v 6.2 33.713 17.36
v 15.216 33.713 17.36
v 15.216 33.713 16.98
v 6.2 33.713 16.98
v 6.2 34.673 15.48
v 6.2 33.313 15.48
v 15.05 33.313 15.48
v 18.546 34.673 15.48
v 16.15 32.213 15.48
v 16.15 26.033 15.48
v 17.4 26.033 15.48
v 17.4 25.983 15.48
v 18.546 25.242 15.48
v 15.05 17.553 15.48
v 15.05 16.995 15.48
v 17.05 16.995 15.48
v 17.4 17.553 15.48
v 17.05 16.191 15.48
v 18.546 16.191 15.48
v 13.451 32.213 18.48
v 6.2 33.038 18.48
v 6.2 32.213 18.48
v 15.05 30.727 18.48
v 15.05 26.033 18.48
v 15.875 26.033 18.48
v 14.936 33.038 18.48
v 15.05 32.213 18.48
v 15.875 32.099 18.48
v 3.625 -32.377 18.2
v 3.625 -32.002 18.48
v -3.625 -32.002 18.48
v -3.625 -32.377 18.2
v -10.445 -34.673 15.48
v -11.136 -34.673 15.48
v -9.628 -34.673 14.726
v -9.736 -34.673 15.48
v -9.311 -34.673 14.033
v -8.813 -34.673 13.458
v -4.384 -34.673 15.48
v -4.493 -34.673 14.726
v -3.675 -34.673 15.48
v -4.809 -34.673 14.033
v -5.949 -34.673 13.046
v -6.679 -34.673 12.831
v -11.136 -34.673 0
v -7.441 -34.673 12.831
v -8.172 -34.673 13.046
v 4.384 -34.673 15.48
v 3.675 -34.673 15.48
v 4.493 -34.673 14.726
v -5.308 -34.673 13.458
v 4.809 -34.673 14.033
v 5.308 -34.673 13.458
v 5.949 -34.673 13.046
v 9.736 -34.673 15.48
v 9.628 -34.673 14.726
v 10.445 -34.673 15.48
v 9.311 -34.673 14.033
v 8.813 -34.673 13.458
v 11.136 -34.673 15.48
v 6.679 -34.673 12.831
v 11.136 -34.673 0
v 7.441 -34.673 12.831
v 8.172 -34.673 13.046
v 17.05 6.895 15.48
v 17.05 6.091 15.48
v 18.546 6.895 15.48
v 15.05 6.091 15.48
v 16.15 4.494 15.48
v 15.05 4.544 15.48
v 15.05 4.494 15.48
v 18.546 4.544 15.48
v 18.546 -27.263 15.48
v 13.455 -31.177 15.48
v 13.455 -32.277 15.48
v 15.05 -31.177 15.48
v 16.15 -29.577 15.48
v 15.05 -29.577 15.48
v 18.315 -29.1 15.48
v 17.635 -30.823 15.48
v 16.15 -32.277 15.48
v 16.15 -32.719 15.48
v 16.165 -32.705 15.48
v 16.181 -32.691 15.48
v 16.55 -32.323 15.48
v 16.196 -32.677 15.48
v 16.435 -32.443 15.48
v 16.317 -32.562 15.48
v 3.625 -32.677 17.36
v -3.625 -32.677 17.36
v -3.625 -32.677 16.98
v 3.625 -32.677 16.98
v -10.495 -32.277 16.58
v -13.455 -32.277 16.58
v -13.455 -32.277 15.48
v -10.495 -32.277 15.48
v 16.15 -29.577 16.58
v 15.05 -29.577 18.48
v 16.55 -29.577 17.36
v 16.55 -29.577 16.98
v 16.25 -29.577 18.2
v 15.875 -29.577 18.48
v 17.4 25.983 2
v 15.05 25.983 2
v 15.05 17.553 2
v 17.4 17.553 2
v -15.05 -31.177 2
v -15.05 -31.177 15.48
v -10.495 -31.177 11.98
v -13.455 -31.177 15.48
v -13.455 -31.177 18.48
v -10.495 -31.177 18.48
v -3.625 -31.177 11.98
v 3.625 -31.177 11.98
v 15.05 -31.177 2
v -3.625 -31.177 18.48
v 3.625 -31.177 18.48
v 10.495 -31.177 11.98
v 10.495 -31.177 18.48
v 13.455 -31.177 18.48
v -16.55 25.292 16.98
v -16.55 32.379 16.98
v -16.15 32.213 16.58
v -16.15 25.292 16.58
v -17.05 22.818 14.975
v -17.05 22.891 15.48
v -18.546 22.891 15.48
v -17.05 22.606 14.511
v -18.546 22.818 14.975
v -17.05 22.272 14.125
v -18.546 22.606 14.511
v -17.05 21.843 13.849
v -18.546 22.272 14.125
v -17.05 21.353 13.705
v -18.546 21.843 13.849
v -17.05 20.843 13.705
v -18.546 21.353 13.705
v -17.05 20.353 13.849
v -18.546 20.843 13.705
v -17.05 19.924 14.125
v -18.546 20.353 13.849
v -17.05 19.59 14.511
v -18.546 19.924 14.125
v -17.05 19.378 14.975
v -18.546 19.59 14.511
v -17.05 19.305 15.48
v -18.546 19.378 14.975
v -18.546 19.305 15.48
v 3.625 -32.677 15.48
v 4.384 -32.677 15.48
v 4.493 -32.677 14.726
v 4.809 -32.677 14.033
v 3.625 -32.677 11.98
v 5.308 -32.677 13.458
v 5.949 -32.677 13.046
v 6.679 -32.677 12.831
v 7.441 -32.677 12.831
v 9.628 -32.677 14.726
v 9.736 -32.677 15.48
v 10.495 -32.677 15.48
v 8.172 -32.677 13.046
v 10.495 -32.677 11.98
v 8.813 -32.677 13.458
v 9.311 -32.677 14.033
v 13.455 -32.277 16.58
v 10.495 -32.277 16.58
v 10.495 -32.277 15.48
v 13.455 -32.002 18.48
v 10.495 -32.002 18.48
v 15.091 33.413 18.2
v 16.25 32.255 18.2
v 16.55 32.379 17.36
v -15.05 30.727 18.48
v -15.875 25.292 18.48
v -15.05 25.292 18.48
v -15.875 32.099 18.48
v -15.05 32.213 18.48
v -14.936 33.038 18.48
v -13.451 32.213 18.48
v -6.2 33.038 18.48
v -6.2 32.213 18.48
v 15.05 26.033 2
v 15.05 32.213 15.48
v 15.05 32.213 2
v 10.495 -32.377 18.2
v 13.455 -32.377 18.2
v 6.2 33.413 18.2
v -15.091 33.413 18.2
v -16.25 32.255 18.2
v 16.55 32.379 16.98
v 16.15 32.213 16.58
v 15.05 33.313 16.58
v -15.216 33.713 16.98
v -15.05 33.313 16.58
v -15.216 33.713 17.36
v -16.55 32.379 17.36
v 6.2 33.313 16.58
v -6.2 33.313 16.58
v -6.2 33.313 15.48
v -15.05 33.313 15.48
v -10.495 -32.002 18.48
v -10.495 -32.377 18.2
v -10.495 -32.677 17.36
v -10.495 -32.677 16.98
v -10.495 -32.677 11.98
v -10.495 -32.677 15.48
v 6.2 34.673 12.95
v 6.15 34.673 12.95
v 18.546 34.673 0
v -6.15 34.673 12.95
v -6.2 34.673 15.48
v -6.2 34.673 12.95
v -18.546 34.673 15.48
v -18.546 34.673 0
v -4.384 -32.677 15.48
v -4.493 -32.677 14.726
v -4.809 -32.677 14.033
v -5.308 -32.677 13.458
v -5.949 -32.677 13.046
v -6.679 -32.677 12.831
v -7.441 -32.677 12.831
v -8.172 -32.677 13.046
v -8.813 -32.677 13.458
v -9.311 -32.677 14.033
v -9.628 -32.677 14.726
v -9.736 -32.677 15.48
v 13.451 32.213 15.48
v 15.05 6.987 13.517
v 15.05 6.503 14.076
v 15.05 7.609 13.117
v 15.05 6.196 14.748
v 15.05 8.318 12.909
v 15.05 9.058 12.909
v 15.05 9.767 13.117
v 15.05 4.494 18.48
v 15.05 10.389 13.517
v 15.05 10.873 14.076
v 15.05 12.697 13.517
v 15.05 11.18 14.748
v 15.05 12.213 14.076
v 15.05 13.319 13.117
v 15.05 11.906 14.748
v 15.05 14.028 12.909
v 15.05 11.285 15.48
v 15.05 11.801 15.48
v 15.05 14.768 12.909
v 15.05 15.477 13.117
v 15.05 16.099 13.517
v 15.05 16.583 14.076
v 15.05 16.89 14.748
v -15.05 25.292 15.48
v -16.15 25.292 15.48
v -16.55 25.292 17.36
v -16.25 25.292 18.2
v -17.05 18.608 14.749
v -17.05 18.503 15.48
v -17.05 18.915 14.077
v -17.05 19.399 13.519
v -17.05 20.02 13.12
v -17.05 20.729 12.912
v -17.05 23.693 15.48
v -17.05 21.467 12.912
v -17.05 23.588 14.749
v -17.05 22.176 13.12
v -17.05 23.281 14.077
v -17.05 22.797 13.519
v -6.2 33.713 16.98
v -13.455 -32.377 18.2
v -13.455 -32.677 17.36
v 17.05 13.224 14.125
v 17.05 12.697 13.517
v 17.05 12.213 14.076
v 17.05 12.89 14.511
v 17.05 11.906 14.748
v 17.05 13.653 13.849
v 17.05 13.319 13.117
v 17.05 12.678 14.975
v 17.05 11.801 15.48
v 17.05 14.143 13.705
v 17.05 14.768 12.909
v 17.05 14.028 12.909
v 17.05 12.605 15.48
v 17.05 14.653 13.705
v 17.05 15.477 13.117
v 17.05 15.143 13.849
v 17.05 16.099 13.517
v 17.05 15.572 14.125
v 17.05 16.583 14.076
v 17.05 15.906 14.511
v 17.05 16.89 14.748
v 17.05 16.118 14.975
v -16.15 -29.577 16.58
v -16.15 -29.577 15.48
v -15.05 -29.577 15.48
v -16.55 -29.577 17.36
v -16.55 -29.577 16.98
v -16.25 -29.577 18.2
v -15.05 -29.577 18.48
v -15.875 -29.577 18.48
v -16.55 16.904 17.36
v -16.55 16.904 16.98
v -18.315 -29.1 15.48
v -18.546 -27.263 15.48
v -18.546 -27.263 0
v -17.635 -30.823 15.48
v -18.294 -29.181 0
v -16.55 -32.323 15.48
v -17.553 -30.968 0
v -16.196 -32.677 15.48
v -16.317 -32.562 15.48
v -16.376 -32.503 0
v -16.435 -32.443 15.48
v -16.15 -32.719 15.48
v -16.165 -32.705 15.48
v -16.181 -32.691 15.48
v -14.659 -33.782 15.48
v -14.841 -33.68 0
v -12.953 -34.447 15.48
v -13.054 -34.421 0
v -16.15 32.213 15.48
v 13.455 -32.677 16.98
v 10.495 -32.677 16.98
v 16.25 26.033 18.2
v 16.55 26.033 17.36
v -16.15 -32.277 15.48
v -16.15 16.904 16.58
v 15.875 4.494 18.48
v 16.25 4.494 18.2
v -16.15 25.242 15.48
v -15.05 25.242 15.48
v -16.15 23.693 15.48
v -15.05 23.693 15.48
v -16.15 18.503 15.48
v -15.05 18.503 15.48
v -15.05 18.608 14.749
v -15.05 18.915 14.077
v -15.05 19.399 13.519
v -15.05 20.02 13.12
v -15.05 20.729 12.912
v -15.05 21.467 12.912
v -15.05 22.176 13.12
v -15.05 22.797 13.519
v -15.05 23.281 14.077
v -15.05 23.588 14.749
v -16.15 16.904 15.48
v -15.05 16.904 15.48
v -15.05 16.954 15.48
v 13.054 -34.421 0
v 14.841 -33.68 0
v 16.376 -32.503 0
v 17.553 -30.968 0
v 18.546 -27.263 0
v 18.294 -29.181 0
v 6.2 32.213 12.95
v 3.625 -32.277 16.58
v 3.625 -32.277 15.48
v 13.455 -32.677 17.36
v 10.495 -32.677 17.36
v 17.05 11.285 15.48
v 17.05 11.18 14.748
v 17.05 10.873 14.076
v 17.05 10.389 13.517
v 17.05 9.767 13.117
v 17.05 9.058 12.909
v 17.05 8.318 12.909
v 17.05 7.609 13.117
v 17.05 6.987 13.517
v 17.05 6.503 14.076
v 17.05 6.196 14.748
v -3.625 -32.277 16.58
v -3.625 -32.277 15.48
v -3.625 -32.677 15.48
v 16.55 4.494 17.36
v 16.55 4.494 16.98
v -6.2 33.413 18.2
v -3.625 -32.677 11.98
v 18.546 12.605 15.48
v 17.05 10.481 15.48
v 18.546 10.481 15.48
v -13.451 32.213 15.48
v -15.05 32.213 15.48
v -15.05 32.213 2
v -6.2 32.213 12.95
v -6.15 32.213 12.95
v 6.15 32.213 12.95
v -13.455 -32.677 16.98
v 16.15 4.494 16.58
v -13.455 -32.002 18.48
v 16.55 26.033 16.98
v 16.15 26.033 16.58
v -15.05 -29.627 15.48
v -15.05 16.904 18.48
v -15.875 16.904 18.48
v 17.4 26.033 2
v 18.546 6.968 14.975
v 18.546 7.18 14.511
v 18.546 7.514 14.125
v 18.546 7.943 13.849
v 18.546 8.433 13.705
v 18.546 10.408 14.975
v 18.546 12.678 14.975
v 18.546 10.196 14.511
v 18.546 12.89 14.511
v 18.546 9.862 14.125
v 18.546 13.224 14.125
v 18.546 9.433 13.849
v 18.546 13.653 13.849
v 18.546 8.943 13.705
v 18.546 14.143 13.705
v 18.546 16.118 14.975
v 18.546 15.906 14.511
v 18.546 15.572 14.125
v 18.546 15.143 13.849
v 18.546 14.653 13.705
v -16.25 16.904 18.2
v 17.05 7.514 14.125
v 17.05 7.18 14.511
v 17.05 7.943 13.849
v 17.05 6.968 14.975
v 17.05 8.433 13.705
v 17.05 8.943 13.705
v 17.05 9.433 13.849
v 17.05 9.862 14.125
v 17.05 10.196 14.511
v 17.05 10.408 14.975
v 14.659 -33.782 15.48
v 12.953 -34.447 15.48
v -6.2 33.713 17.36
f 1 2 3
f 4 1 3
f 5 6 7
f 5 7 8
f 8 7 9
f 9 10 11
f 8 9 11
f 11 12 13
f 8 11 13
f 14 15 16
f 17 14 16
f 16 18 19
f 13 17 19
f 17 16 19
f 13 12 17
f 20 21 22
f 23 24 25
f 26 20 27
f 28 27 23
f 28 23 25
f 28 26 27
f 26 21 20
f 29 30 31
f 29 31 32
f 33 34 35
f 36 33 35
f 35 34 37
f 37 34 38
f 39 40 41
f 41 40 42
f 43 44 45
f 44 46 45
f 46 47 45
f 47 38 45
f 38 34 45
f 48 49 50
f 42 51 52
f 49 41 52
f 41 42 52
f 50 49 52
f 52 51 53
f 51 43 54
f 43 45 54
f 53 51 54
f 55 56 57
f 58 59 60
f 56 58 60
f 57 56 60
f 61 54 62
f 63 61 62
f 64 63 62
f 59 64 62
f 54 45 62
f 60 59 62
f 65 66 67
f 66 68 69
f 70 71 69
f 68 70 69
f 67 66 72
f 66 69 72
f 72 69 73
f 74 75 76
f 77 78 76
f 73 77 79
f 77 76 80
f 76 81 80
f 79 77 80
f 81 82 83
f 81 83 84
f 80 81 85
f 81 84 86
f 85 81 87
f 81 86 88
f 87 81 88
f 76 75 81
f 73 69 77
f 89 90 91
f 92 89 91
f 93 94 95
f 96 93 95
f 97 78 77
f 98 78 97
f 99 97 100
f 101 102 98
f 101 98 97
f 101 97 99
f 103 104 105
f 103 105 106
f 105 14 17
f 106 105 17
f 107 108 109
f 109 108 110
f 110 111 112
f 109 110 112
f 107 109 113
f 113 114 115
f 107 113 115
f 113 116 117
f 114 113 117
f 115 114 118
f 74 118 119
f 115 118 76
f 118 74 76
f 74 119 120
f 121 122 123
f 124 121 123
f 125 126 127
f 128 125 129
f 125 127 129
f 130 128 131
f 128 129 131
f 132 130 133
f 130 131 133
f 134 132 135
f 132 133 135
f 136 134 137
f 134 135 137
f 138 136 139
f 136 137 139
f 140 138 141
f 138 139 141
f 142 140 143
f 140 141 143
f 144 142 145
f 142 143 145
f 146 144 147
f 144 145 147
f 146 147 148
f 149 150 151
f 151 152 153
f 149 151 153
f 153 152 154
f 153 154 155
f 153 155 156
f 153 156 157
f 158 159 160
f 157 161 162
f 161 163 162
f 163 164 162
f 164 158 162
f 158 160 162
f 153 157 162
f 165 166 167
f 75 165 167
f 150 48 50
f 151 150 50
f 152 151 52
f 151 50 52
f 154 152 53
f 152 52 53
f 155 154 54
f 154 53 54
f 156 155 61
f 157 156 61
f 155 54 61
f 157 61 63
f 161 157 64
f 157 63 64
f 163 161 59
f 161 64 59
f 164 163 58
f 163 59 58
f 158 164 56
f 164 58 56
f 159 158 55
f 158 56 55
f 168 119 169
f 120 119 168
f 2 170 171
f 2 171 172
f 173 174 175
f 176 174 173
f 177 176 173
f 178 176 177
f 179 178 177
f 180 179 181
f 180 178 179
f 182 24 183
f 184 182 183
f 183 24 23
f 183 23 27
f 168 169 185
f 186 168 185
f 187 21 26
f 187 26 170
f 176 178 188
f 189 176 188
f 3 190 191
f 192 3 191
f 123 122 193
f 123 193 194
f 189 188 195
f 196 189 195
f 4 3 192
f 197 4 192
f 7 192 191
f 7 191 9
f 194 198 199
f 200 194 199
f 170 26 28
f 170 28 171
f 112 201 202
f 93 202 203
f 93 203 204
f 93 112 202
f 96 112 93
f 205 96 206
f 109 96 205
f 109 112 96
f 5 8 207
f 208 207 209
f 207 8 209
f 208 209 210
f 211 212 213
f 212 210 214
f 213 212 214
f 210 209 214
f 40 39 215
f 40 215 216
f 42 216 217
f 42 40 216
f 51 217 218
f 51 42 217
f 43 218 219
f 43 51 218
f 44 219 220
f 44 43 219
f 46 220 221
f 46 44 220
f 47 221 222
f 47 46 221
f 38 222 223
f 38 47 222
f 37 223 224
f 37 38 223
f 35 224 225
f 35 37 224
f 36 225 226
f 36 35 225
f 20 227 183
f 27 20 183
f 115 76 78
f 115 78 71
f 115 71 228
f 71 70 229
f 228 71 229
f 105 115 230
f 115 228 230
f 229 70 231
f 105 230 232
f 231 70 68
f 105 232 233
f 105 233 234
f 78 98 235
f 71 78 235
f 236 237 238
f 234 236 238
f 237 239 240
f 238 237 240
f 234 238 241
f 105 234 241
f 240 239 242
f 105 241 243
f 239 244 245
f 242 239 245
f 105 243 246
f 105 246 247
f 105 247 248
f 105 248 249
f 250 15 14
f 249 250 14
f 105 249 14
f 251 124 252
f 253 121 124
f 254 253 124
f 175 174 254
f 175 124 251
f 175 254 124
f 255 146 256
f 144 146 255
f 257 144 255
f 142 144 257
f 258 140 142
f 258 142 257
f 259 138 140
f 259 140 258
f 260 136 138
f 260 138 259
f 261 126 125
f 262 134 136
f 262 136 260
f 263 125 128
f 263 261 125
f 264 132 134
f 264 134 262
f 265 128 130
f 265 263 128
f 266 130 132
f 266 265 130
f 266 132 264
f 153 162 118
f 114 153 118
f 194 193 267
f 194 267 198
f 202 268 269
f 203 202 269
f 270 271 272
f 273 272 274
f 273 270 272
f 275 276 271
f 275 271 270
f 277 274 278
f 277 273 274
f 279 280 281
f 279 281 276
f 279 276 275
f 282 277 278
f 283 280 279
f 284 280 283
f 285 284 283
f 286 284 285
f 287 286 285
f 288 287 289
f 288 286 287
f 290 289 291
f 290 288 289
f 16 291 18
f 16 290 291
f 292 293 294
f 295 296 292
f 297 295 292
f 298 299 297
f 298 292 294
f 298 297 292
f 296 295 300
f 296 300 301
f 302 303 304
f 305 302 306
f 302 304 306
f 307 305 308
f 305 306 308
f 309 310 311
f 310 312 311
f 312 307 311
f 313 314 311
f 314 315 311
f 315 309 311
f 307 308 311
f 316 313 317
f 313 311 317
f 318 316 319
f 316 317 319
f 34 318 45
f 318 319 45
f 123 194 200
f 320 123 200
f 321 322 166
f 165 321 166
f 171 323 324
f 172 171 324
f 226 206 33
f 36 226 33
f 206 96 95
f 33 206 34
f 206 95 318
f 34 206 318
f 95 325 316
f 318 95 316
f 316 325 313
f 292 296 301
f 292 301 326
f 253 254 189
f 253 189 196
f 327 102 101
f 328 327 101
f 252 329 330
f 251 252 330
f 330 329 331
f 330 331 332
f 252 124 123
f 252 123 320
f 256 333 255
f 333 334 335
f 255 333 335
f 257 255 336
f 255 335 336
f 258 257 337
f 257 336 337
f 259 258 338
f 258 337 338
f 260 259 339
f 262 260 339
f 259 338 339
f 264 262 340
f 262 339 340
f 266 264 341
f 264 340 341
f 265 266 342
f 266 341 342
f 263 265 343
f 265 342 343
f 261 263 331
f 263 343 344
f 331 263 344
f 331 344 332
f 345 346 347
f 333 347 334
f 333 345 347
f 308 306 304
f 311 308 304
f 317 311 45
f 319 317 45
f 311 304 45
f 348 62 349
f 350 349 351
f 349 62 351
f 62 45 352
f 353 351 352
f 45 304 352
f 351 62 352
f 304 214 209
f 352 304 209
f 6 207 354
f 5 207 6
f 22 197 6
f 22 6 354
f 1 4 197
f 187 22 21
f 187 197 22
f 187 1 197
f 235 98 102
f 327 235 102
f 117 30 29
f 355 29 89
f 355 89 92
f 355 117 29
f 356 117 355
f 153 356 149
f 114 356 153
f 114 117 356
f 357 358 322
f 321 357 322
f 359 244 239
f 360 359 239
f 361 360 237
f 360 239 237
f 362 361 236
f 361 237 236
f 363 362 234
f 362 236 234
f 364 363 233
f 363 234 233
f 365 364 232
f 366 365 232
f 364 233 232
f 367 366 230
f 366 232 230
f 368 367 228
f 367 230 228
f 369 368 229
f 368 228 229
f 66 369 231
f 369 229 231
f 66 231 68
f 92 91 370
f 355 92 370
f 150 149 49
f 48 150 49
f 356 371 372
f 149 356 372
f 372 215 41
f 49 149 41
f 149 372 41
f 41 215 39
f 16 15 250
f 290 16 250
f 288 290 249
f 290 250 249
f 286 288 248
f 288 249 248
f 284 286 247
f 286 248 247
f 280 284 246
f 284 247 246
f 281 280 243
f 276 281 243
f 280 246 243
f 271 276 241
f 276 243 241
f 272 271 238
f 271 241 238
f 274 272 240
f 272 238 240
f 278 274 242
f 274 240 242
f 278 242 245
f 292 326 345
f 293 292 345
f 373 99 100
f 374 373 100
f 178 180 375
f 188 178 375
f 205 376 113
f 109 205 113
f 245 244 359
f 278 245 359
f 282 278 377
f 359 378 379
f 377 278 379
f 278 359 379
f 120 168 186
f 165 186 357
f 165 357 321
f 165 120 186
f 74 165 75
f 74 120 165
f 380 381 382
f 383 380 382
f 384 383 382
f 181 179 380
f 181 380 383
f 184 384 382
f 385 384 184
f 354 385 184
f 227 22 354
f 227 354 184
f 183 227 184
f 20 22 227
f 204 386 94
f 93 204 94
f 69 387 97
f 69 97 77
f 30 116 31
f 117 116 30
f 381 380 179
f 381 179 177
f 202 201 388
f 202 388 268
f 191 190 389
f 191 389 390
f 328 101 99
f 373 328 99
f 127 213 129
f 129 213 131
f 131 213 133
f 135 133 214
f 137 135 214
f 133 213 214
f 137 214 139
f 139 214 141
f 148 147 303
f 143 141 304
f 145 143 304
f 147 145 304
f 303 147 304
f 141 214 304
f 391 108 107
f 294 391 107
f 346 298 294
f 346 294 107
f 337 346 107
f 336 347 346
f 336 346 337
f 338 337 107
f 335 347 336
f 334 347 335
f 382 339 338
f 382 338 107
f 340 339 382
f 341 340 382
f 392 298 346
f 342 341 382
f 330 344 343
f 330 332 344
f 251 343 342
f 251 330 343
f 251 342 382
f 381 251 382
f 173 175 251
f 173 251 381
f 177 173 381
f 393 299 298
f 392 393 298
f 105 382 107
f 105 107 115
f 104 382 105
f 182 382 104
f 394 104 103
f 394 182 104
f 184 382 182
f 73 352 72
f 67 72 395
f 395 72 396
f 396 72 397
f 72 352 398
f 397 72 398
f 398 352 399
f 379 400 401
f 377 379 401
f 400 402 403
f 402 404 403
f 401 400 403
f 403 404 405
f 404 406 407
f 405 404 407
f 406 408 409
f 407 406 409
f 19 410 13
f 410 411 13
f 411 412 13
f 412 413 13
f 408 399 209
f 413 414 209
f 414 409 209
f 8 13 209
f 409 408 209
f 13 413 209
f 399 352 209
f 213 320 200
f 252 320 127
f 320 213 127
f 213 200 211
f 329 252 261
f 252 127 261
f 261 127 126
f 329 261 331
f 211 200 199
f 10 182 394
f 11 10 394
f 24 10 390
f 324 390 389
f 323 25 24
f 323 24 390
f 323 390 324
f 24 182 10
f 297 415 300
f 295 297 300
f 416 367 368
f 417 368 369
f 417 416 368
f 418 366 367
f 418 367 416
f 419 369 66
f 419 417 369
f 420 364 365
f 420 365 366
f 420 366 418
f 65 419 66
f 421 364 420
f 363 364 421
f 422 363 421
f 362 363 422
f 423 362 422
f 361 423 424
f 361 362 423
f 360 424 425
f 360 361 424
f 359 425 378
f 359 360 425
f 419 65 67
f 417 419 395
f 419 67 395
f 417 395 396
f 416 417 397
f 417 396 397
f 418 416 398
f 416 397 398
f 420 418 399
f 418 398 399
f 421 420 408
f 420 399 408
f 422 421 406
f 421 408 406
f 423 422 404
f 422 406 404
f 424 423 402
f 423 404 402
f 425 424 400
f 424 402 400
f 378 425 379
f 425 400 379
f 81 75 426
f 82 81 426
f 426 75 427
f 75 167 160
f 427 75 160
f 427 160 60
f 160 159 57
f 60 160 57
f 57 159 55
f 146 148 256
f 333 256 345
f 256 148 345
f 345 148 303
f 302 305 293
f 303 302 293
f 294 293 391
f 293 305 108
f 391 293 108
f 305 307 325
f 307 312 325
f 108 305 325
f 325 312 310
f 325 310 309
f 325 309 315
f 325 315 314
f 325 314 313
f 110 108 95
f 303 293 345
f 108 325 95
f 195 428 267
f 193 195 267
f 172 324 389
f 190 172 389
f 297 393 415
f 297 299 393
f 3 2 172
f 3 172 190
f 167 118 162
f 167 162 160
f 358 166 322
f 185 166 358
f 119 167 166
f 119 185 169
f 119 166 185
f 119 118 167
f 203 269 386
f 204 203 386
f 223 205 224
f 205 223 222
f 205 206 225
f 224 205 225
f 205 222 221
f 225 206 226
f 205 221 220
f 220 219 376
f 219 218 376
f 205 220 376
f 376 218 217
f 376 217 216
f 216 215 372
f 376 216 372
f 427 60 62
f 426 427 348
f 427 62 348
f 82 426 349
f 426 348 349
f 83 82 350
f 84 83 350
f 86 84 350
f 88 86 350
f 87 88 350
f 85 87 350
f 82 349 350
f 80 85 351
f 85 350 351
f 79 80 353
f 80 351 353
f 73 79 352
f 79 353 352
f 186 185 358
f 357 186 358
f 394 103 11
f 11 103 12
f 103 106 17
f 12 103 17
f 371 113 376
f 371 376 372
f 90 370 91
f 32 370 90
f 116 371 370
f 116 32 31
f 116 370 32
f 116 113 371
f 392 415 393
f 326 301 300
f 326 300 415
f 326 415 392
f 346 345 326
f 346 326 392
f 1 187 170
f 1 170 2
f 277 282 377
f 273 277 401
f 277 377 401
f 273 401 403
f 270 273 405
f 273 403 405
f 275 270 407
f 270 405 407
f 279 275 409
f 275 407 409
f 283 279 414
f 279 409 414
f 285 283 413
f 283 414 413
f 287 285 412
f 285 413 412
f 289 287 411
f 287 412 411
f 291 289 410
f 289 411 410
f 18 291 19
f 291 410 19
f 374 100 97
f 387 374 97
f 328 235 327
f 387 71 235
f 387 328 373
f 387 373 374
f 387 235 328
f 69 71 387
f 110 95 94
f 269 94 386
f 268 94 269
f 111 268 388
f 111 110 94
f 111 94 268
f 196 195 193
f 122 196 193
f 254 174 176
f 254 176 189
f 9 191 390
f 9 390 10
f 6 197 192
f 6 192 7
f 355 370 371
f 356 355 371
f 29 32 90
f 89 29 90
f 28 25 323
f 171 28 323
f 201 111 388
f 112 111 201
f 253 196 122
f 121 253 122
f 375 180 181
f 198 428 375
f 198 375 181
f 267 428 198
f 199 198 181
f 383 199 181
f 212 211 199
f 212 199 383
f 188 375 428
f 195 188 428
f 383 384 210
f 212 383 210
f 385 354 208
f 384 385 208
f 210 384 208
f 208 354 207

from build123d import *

# Parameters (mm, degrees)
BOSS_EXTRUDE1_DEPTH     = 18.48
SKETCH3_W               = 30.099980533
SKETCH3_H               = 63.389983028
CUT_EXTRUDE1_DEPTH      = 16.48
CUT_EXTRUDE3_DEPTH      = 103.48
CUT_EXTRUDE4_DEPTH      = 103.48
CUT_EXTRUDE5_DEPTH      = 54.54
CUT_EXTRUDE6_DEPTH      = 10
SKETCH11_W              = 2.999998629
SKETCH11_H              = 20.697738044
CUT_EXTRUDE7_DEPTH      = 10
SKETCH12_R              = 1.792950556
CUT_EXTRUDE8_DEPTH      = 10
CUT_EXTRUDE9_DEPTH      = 10
CUT_EXTRUDE9_DEPTH_BACK = 13.480001
SKETCH13_W              = 4.166997139
SKETCH13_H              = 8.430000395
SKETCH14_R              = 2.597288525
CUT_EXTRUDE10_DEPTH     = 2
SKETCH15_W              = 12.299997266
SKETCH15_H              = 5.529999733
CUT_EXTRUDE11_DEPTH     = 21
SKETCH16_R              = 1.792950556
CUT_EXTRUDE12_DEPTH     = 21
SKETCH17_W              = 2.999998645
SKETCH17_H              = 8.287733437
CUT_EXTRUDE13_DEPTH     = 21
SKETCH18_R              = 2.594885252
CUT_EXTRUDE14_DEPTH     = 2
SKETCH20_W              = 6.770000094
SKETCH20_H              = 1.500006354
CUT_EXTRUDE15_DEPTH     = 3.5
CUT_EXTRUDE16_DEPTH     = 2.999998629
SKETCH23_W              = 3.697606461
SKETCH23_H              = 2.985965669
CUT_EXTRUDE18_DEPTH     = 8.5
CUT_EXTRUDE19_DEPTH     = 0.05
CUT_EXTRUDE20_DEPTH     = 0.05
CUT_EXTRUDE21_DEPTH     = 0.05
CUT_EXTRUDE22_START     = -0.05
CUT_EXTRUDE22_DEPTH     = 0.05
CUT_EXTRUDE23_DEPTH     = 0.05
CUT_EXTRUDE24_DEPTH     = 0.05
CUT_EXTRUDE25_DEPTH     = 0.05
CUT_EXTRUDE26_DEPTH     = 0.05
CUT_EXTRUDE27_DEPTH     = 0.05
CUT_EXTRUDE28_START     = -0.05
CUT_EXTRUDE28_DEPTH     = 0.05
CUT_EXTRUDE29_DEPTH     = 0.05
CUT_EXTRUDE30_DEPTH     = 0.05
CUT_EXTRUDE31_DEPTH     = 0.05
CUT_EXTRUDE32_DEPTH     = 0.05
CUT_EXTRUDE33_DEPTH     = 11.05
CUT_EXTRUDE34_DEPTH     = 11.05


# Read off the part's stored shape, not the designer's step: Cut-Extrude16, Cut-Extrude22, Cut-Extrude28
with BuildPart() as part:
    # Sketch1 → Boss-Extrude1 (new body)
    with BuildSketch(Plane.XY):
        with BuildLine():
            Line((18.546197564, -27.263243275), (18.546197564, 34.673092364))
            Line((18.546197564, 34.673092364), (-18.546197564, 34.673092364))
            Line((-18.546197564, 34.673092364), (-18.546197564, -27.263243275))
            ThreePointArc((-18.546197564, -27.263243275), (-16.375903013, -32.502797813), (-11.136348475, -34.673092364))
            Line((-11.136348475, -34.673092364), (11.136348475, -34.673092364))
            ThreePointArc((11.136348475, -34.673092364), (16.375903013, -32.502797813), (18.546197564, -27.263243275))
        make_face()
    extrude(amount=BOSS_EXTRUDE1_DEPTH)

    # Sketch3 → Cut-Extrude1 (cut)
    with BuildSketch(Plane.XY.offset(18.48)):
        with Locations((-1.1177e-05, 0.518105401)):
            Rectangle(SKETCH3_W, SKETCH3_H)
    extrude(amount=-CUT_EXTRUDE1_DEPTH, mode=Mode.SUBTRACT)

    # Sketch5 → Cut-Extrude3 (cut)
    with BuildSketch(Plane.XZ.offset(34.673092364)):
        Polygon((16.150001437, 15.480001371), (18.546197564, 15.480001371), (18.546197564, 18.48), (15.875000507, 18.48), (16.249999404, 18.200001593), (16.550000757, 17.360000785), (16.550000757, 16.980000685), (16.150001437, 16.580001365), align=None)
    cut_extrude3 = extrude(amount=-CUT_EXTRUDE3_DEPTH, mode=Mode.SUBTRACT)

    # Mirror2: Cut-Extrude3 across plane
    add(cut_extrude3.mirror(Plane(origin=(0, 0, 0), x_dir=(0, 0, 1), z_dir=(1, 0, 0))), mode=Mode.SUBTRACT)

    # Sketch6 → Cut-Extrude4 (cut)
    with BuildSketch(Plane.ZY.offset(18.546197564)):
        Polygon((15.48000154, -32.276896237), (15.48000154, -34.673092364), (18.48, -34.673092364), (18.48, -32.001895942), (18.200001593, -32.376894839), (17.360000785, -32.676892467), (16.980000685, -32.676892467), (16.580002, -32.276896237), align=None)
    extrude(amount=-CUT_EXTRUDE4_DEPTH, mode=Mode.SUBTRACT)

    # Sketch8 → Cut-Extrude5 (cut)
    with BuildSketch(Plane.ZY.offset(18.546197564)):
        Polygon((15.480001371, 33.313093184), (15.480001371, 34.673092364), (18.48, 34.673092364), (18.48, 33.038092254), (18.200001593, 33.413091151), (17.360000785, 33.713092504), (16.980000685, 33.713092504), (16.580001365, 33.313093184), align=None)
    extrude(amount=-CUT_EXTRUDE5_DEPTH, mode=Mode.SUBTRACT)

    # Sketch9 → Cut-Extrude6 (cut)
    with BuildSketch(Plane.XZ.offset(34.673092364)):
        with BuildLine():
            Line((-10.44518366, 18.480000048), (-3.675183566, 18.480000048))
            Line((-3.675183566, 18.480000048), (-3.675183566, 15.480001419))
            Line((-3.675183566, 15.480001419), (-4.384112223, 15.480001419))
            ThreePointArc((-4.384112223, 15.480001419), (-7.060183613, 12.803930029), (-9.736255003, 15.480001419))
            Line((-9.736255003, 15.480001419), (-10.44518366, 15.480001419))
            Line((-10.44518366, 15.480001419), (-10.44518366, 18.480000048))
        make_face()
    cut_extrude6 = extrude(amount=-CUT_EXTRUDE6_DEPTH, mode=Mode.SUBTRACT)

    # Mirror3: Cut-Extrude6 across plane
    add(cut_extrude6.mirror(Plane(origin=(0, 0, 0), x_dir=(0, 0, 1), z_dir=(1, 0, 0))), mode=Mode.SUBTRACT)

    # Sketch11 → Cut-Extrude7 (cut)
    with BuildSketch(Plane(origin=(18.546197564, 0, 0), x_dir=(0, 0, -1), z_dir=(1, 0, 0))):
        with Locations((-16.980000686, 14.89309402)):
            Rectangle(SKETCH11_W, SKETCH11_H)
    extrude(amount=-CUT_EXTRUDE7_DEPTH, mode=Mode.SUBTRACT)

    # Sketch12 → Cut-Extrude8 (cut)
    with BuildSketch(Plane(origin=(18.546197564, 0, 0), x_dir=(0, 0, -1), z_dir=(1, 0, 0))):
        with Locations((-15.479999974, 14.398097469)):
            Circle(SKETCH12_R)
        with Locations((-15.479999974, 8.688099159)):
            Circle(SKETCH12_R)
    extrude(amount=-CUT_EXTRUDE8_DEPTH, mode=Mode.SUBTRACT)

    # Sketch13 → Cut-Extrude9 (cut, two sides: drawn at the far end of the back side and taken through both)
    with BuildSketch(Plane.XY.offset(15.480001371).offset(-CUT_EXTRUDE9_DEPTH_BACK)):
        with Locations((15.316501675, 21.768090724)):
            Rectangle(SKETCH13_W, SKETCH13_H)
    extrude(amount=CUT_EXTRUDE9_DEPTH + CUT_EXTRUDE9_DEPTH_BACK, mode=Mode.SUBTRACT)

    # Sketch14 → Cut-Extrude10 (cut)
    with BuildSketch(Plane.ZY.offset(-15.04997909)):
        with Locations((15.479999974, 14.398097469)):
            Circle(SKETCH14_R)
        with Locations((15.479999974, 8.688099159)):
            Circle(SKETCH14_R)
    extrude(amount=-CUT_EXTRUDE10_DEPTH, mode=Mode.SUBTRACT)

    # Sketch15 → Cut-Extrude11 (cut)
    with BuildSketch(Plane(origin=(0, 34.673092364, 0), x_dir=(1, 0, 0), z_dir=(0, 1, 0))):
        with Locations((0, -15.715000134)):
            Rectangle(SKETCH15_W, SKETCH15_H)
    extrude(amount=-CUT_EXTRUDE11_DEPTH, mode=Mode.SUBTRACT)

    # Sketch16 → Cut-Extrude12 (cut)
    with BuildSketch(Plane.ZY.offset(18.546197564)):
        with Locations(Location((15.480001371, 21.0980954, 0), (0, 0, 270))):
            Circle(SKETCH16_R)
    extrude(amount=-CUT_EXTRUDE12_DEPTH, mode=Mode.SUBTRACT)

    # Sketch17 → Cut-Extrude13 (cut)
    with BuildSketch(Plane.ZY.offset(18.546197564)):
        with Locations((16.980000839, 21.098096485)):
            Rectangle(SKETCH17_W, SKETCH17_H)
    extrude(amount=-CUT_EXTRUDE13_DEPTH, mode=Mode.SUBTRACT)

    # Sketch18 → Cut-Extrude14 (cut)
    with BuildSketch(Plane(origin=(-15.050001443, 0, 0), x_dir=(0, 0, -1), z_dir=(1, 0, 0))):
        with Locations((-15.480001371, 21.0980954)):
            Circle(SKETCH18_R)
    extrude(amount=-CUT_EXTRUDE14_DEPTH, mode=Mode.SUBTRACT)

    # Sketch20 → Cut-Extrude15 (cut)
    with BuildSketch(Plane.XY.offset(15.480001371)):
        with Locations((7.060183613, -31.92688929)):
            Rectangle(SKETCH20_W, SKETCH20_H)
        with Locations((-7.060183613, -31.92688929)):
            Rectangle(SKETCH20_W, SKETCH20_H)
    extrude(amount=-CUT_EXTRUDE15_DEPTH, mode=Mode.SUBTRACT)

    # Cut-Extrude16 outline → Cut-Extrude16 (cut)
    with BuildSketch(Plane.XY.offset(15.480001371)):
        with BuildLine():
            Line((13.505182746, -32.676892467), (16.195821367, -32.676892467))
            ThreePointArc((16.195821367, -32.676892467), (16.375904613, -32.502796213), (16.550000757, -32.32271286))
            Line((16.550000757, -32.32271286), (16.550000757, -29.626887815))
            Line((16.550000757, -29.626887815), (15.04997909, -29.626887815))
            Line((15.04997909, -29.626887815), (15.04997909, -31.176886113))
            Line((15.04997909, -31.176886113), (13.505182746, -31.176886113))
            Line((13.505182746, -31.176886113), (13.505182746, -32.676892467))
        make_face()
    cut_extrude16 = extrude(amount=CUT_EXTRUDE16_DEPTH, mode=Mode.SUBTRACT)

    # Mirror4: Cut-Extrude16 across plane
    add(cut_extrude16.mirror(Plane(origin=(0, 0, 0), x_dir=(0, 0, 1), z_dir=(1, 0, 0))), mode=Mode.SUBTRACT)

    # Sketch23 → Cut-Extrude18 (cut)
    with BuildSketch(Plane.XY.offset(15.480001371)):
        with Locations((15.300246124, 32.22010967)):
            Rectangle(SKETCH23_W, SKETCH23_H)
    cut_extrude18 = extrude(amount=CUT_EXTRUDE18_DEPTH, mode=Mode.SUBTRACT)

    # Sweep1: sweep along a path in Sketch24
    with BuildLine(Plane.XY.offset(15.480001371)) as sweep1_path:
        Line((16.150001437, 30.727126835), (16.150001437, 32.21309319))
        Line((16.150001437, 32.21309319), (15.050000511, 33.313093184))
        Line((15.050000511, 33.313093184), (13.451442893, 33.313093184))
    # Sketch25 → Sweep1 (sweep)
    with BuildSketch(Plane(origin=(0, 30.727126835, 0), x_dir=(1, 0, 0), z_dir=(0, 1, 0))):
        Polygon((16.150001437, -16.580001365), (16.150001437, -15.480001371), (15.04997909, -15.480001371), (15.04997909, -18.48), (15.875000507, -18.48), (16.249999404, -18.200001593), (16.550000757, -17.360000785), (16.550000757, -16.980000685), align=None)
    sweep1 = sweep(path=sweep1_path.line, transition=Transition.RIGHT)

    # Mirror6: Cut-Extrude18, Sweep1 across plane
    add(cut_extrude18.mirror(Plane(origin=(0, 0, 0), x_dir=(0, 0, 1), z_dir=(1, 0, 0))), mode=Mode.SUBTRACT)
    add(sweep1.mirror(Plane(origin=(0, 0, 0), x_dir=(0, 0, 1), z_dir=(1, 0, 0))))

    # Sketch26 → Cut-Extrude19 (cut)
    with BuildSketch(Plane.XZ.offset(-25.241963203)):
        Polygon((-15.050001443, 18.480000161), (-15.875000291, 18.480000161), (-16.249999404, 18.200001593), (-16.550000757, 17.360000785), (-16.550000757, 16.980000685), (-16.150001437, 16.580001365), (-16.150001437, 15.480001516), (-15.050001443, 15.480001516), align=None)
    extrude(amount=-CUT_EXTRUDE19_DEPTH, mode=Mode.SUBTRACT)

    # Sketch27 → Cut-Extrude20 (cut)
    with BuildSketch(Plane(origin=(0, 16.954229766, 0), x_dir=(1, 0, 0), z_dir=(0, 1, 0))):
        Polygon((-15.050001443, -15.480001516), (-16.150001437, -15.480001516), (-16.150001437, -16.580001365), (-16.550000757, -16.980000685), (-16.550000757, -17.360000785), (-16.249999404, -18.200001593), (-15.875000291, -18.480000161), (-15.050001443, -18.480000161), align=None)
    extrude(amount=-CUT_EXTRUDE20_DEPTH, mode=Mode.SUBTRACT)

    # Sketch28 → Cut-Extrude21 (cut)
    with BuildSketch(Plane.XZ.offset(29.626887815)):
        Polygon((-15.050001443, 18.48), (-15.875000507, 18.48), (-16.249999404, 18.200001593), (-16.550000757, 17.360000785), (-16.550000757, 16.980000685), (-16.150001437, 16.580001365), (-16.150001437, 15.480001371), (-15.050001443, 15.480001371), align=None)
    extrude(amount=-CUT_EXTRUDE21_DEPTH, mode=Mode.SUBTRACT)

    # Cut-Extrude22 outline → Cut-Extrude22 (cut)
    with BuildSketch(Plane.ZY.offset(13.505182746).offset(CUT_EXTRUDE22_START)):
        Polygon((18.200001593, -32.376894839), (18.480000048, -32.001895878), (18.48, -31.176886113), (15.480001371, -31.176886113), (15.480001371, -32.276896237), (16.580002, -32.276896237), (16.980000685, -32.676892467), (17.360004046, -32.676892467), align=None)
    extrude(amount=CUT_EXTRUDE22_DEPTH, mode=Mode.SUBTRACT)

    # Sketch30 → Cut-Extrude23 (cut)
    with BuildSketch(Plane.XZ.offset(29.626887815)):
        Polygon((15.04997909, 15.480001371), (16.150001437, 15.480001371), (16.150001437, 16.580001365), (16.550000757, 16.980000685), (16.550000757, 17.360000785), (16.249999404, 18.200001593), (15.875000507, 18.48), (15.04997909, 18.48), align=None)
    extrude(amount=-CUT_EXTRUDE23_DEPTH, mode=Mode.SUBTRACT)

    # Sketch31 → Cut-Extrude24 (cut)
    with BuildSketch(Plane(origin=(-10.44518366, 0, 0), x_dir=(0, 0, -1), z_dir=(1, 0, 0))):
        Polygon((-11.980001371, -31.176886113), (-18.480000048, -31.176886113), (-18.480000048, -32.001895878), (-18.200001593, -32.376894839), (-17.360000785, -32.676892467), (-16.980000685, -32.676892467), (-16.580002, -32.276896237), (-15.480001371, -32.276896237), (-15.480001371, -32.676892467), (-11.980001371, -32.676892467), align=None)
    extrude(amount=-CUT_EXTRUDE24_DEPTH, mode=Mode.SUBTRACT)

    # Sketch32 → Cut-Extrude25 (cut)
    with BuildSketch(Plane.ZY.offset(3.675183566)):
        Polygon((18.480000048, -31.176886113), (11.980001371, -31.176886113), (11.980001371, -32.676892467), (15.480001371, -32.676892467), (15.480001371, -32.276896237), (16.580002, -32.276896237), (16.980000685, -32.676892467), (17.360000785, -32.676892467), (18.200001593, -32.376894839), (18.480000048, -32.001895878), align=None)
    extrude(amount=-CUT_EXTRUDE25_DEPTH, mode=Mode.SUBTRACT)

    # Sketch33 → Cut-Extrude26 (cut)
    with BuildSketch(Plane(origin=(3.675183566, 0, 0), x_dir=(0, 0, -1), z_dir=(1, 0, 0))):
        Polygon((-18.480000048, -31.176886113), (-18.480000048, -32.001895878), (-18.200001593, -32.376894839), (-17.360000785, -32.676892467), (-16.980000685, -32.676892467), (-16.580002, -32.276896237), (-15.480001371, -32.276896237), (-15.480001371, -32.676892467), (-11.980001371, -32.676892467), (-11.980001371, -31.176886113), align=None)
    extrude(amount=-CUT_EXTRUDE26_DEPTH, mode=Mode.SUBTRACT)

    # Sketch34 → Cut-Extrude27 (cut)
    with BuildSketch(Plane.ZY.offset(-10.44518366)):
        Polygon((18.480000048, -31.176886113), (11.980001371, -31.176886113), (11.980001371, -32.676892467), (15.480001371, -32.676892467), (15.480001371, -32.276896237), (16.580002, -32.276896237), (16.980000685, -32.676892467), (17.360000785, -32.676892467), (18.200001593, -32.376894839), (18.480000048, -32.001895878), align=None)
    extrude(amount=-CUT_EXTRUDE27_DEPTH, mode=Mode.SUBTRACT)

    # Cut-Extrude28 outline → Cut-Extrude28 (cut)
    with BuildSketch(Plane(origin=(13.505182746, 0, 0), x_dir=(0, 0, -1), z_dir=(1, 0, 0)).offset(CUT_EXTRUDE28_START)):
        Polygon((-15.480001371, -31.176886113), (-18.480000048, -31.176886113), (-18.48, -32.001895942), (-18.200001593, -32.376894839), (-17.360000785, -32.676892467), (-16.980000685, -32.676892467), (-16.580002, -32.276896237), (-15.480001371, -32.276896237), align=None)
    extrude(amount=CUT_EXTRUDE28_DEPTH, mode=Mode.SUBTRACT)

    # Sketch36 → Cut-Extrude29 (cut)
    with BuildSketch(Plane(origin=(0, 4.544224998, 0), x_dir=(1, 0, 0), z_dir=(0, 1, 0))):
        Polygon((15.04997909, -15.480001371), (15.04997909, -18.48), (15.875000507, -18.48), (16.249999404, -18.200001593), (16.550000757, -17.360000785), (16.550000757, -16.980000685), (16.150001437, -16.580001365), (16.150001437, -15.480001371), align=None)
    extrude(amount=-CUT_EXTRUDE29_DEPTH, mode=Mode.SUBTRACT)

    # Sketch37 → Cut-Extrude30 (cut)
    with BuildSketch(Plane.XZ.offset(-25.983090921)):
        Polygon((17.400000245, 15.480001371), (16.150001437, 15.480001371), (16.150001437, 16.580001365), (16.550000757, 16.980000685), (16.550000757, 17.360000785), (16.249999404, 18.200001593), (15.875000507, 18.48), (15.04997909, 18.48), (15.04997909, 2), (17.400000245, 2), align=None)
    extrude(amount=-CUT_EXTRUDE30_DEPTH, mode=Mode.SUBTRACT)

    # Sketch38 → Cut-Extrude31 (cut)
    with BuildSketch(Plane(origin=(-6.149998633, 0, 0), x_dir=(0, 0, -1), z_dir=(1, 0, 0))):
        Polygon((-12.950000267, 32.213096915), (-12.950000267, 34.673092364), (-15.480001371, 34.673092364), (-15.480001371, 33.313093184), (-16.580001365, 33.313093184), (-16.980000685, 33.713092504), (-17.360000785, 33.713092504), (-18.200001593, 33.413091151), (-18.48, 33.038092254), (-18.48, 32.213096915), align=None)
    extrude(amount=-CUT_EXTRUDE31_DEPTH, mode=Mode.SUBTRACT)

    # Sketch39 → Cut-Extrude32 (cut)
    with BuildSketch(Plane.ZY.offset(-6.149998633)):
        Polygon((18.48, 32.213096915), (18.48, 33.038092254), (18.200001593, 33.413091151), (17.360000785, 33.713092504), (16.980000685, 33.713092504), (16.580001365, 33.313093184), (15.480001371, 33.313093184), (15.480001371, 34.673092364), (12.950000267, 34.673092364), (12.950000267, 32.213096915), align=None)
    extrude(amount=-CUT_EXTRUDE32_DEPTH, mode=Mode.SUBTRACT)

    # Sketch41 → Cut-Extrude33 (cut)
    with BuildSketch(Plane(origin=(0, 0, 15.480001371), x_dir=(-1, 0, 0), z_dir=(0, 0, -1))):
        Polygon((-13.451442893, 32.213070838), (-15.04997909, 32.213096915), (-15.04997909, 31.544283758), (-12.912088878, 30.446738359), align=None)
    extrude(amount=-CUT_EXTRUDE33_DEPTH, mode=Mode.SUBTRACT)

    # Sketch42 → Cut-Extrude34 (cut)
    with BuildSketch(Plane(origin=(0, 0, 15.480001371), x_dir=(-1, 0, 0), z_dir=(0, 0, -1))):
        Polygon((13.451442893, 32.213070838), (15.050001443, 32.213096915), (15.050001443, 29.734697946), align=None)
    extrude(amount=-CUT_EXTRUDE34_DEPTH, mode=Mode.SUBTRACT)


solid = part.part
